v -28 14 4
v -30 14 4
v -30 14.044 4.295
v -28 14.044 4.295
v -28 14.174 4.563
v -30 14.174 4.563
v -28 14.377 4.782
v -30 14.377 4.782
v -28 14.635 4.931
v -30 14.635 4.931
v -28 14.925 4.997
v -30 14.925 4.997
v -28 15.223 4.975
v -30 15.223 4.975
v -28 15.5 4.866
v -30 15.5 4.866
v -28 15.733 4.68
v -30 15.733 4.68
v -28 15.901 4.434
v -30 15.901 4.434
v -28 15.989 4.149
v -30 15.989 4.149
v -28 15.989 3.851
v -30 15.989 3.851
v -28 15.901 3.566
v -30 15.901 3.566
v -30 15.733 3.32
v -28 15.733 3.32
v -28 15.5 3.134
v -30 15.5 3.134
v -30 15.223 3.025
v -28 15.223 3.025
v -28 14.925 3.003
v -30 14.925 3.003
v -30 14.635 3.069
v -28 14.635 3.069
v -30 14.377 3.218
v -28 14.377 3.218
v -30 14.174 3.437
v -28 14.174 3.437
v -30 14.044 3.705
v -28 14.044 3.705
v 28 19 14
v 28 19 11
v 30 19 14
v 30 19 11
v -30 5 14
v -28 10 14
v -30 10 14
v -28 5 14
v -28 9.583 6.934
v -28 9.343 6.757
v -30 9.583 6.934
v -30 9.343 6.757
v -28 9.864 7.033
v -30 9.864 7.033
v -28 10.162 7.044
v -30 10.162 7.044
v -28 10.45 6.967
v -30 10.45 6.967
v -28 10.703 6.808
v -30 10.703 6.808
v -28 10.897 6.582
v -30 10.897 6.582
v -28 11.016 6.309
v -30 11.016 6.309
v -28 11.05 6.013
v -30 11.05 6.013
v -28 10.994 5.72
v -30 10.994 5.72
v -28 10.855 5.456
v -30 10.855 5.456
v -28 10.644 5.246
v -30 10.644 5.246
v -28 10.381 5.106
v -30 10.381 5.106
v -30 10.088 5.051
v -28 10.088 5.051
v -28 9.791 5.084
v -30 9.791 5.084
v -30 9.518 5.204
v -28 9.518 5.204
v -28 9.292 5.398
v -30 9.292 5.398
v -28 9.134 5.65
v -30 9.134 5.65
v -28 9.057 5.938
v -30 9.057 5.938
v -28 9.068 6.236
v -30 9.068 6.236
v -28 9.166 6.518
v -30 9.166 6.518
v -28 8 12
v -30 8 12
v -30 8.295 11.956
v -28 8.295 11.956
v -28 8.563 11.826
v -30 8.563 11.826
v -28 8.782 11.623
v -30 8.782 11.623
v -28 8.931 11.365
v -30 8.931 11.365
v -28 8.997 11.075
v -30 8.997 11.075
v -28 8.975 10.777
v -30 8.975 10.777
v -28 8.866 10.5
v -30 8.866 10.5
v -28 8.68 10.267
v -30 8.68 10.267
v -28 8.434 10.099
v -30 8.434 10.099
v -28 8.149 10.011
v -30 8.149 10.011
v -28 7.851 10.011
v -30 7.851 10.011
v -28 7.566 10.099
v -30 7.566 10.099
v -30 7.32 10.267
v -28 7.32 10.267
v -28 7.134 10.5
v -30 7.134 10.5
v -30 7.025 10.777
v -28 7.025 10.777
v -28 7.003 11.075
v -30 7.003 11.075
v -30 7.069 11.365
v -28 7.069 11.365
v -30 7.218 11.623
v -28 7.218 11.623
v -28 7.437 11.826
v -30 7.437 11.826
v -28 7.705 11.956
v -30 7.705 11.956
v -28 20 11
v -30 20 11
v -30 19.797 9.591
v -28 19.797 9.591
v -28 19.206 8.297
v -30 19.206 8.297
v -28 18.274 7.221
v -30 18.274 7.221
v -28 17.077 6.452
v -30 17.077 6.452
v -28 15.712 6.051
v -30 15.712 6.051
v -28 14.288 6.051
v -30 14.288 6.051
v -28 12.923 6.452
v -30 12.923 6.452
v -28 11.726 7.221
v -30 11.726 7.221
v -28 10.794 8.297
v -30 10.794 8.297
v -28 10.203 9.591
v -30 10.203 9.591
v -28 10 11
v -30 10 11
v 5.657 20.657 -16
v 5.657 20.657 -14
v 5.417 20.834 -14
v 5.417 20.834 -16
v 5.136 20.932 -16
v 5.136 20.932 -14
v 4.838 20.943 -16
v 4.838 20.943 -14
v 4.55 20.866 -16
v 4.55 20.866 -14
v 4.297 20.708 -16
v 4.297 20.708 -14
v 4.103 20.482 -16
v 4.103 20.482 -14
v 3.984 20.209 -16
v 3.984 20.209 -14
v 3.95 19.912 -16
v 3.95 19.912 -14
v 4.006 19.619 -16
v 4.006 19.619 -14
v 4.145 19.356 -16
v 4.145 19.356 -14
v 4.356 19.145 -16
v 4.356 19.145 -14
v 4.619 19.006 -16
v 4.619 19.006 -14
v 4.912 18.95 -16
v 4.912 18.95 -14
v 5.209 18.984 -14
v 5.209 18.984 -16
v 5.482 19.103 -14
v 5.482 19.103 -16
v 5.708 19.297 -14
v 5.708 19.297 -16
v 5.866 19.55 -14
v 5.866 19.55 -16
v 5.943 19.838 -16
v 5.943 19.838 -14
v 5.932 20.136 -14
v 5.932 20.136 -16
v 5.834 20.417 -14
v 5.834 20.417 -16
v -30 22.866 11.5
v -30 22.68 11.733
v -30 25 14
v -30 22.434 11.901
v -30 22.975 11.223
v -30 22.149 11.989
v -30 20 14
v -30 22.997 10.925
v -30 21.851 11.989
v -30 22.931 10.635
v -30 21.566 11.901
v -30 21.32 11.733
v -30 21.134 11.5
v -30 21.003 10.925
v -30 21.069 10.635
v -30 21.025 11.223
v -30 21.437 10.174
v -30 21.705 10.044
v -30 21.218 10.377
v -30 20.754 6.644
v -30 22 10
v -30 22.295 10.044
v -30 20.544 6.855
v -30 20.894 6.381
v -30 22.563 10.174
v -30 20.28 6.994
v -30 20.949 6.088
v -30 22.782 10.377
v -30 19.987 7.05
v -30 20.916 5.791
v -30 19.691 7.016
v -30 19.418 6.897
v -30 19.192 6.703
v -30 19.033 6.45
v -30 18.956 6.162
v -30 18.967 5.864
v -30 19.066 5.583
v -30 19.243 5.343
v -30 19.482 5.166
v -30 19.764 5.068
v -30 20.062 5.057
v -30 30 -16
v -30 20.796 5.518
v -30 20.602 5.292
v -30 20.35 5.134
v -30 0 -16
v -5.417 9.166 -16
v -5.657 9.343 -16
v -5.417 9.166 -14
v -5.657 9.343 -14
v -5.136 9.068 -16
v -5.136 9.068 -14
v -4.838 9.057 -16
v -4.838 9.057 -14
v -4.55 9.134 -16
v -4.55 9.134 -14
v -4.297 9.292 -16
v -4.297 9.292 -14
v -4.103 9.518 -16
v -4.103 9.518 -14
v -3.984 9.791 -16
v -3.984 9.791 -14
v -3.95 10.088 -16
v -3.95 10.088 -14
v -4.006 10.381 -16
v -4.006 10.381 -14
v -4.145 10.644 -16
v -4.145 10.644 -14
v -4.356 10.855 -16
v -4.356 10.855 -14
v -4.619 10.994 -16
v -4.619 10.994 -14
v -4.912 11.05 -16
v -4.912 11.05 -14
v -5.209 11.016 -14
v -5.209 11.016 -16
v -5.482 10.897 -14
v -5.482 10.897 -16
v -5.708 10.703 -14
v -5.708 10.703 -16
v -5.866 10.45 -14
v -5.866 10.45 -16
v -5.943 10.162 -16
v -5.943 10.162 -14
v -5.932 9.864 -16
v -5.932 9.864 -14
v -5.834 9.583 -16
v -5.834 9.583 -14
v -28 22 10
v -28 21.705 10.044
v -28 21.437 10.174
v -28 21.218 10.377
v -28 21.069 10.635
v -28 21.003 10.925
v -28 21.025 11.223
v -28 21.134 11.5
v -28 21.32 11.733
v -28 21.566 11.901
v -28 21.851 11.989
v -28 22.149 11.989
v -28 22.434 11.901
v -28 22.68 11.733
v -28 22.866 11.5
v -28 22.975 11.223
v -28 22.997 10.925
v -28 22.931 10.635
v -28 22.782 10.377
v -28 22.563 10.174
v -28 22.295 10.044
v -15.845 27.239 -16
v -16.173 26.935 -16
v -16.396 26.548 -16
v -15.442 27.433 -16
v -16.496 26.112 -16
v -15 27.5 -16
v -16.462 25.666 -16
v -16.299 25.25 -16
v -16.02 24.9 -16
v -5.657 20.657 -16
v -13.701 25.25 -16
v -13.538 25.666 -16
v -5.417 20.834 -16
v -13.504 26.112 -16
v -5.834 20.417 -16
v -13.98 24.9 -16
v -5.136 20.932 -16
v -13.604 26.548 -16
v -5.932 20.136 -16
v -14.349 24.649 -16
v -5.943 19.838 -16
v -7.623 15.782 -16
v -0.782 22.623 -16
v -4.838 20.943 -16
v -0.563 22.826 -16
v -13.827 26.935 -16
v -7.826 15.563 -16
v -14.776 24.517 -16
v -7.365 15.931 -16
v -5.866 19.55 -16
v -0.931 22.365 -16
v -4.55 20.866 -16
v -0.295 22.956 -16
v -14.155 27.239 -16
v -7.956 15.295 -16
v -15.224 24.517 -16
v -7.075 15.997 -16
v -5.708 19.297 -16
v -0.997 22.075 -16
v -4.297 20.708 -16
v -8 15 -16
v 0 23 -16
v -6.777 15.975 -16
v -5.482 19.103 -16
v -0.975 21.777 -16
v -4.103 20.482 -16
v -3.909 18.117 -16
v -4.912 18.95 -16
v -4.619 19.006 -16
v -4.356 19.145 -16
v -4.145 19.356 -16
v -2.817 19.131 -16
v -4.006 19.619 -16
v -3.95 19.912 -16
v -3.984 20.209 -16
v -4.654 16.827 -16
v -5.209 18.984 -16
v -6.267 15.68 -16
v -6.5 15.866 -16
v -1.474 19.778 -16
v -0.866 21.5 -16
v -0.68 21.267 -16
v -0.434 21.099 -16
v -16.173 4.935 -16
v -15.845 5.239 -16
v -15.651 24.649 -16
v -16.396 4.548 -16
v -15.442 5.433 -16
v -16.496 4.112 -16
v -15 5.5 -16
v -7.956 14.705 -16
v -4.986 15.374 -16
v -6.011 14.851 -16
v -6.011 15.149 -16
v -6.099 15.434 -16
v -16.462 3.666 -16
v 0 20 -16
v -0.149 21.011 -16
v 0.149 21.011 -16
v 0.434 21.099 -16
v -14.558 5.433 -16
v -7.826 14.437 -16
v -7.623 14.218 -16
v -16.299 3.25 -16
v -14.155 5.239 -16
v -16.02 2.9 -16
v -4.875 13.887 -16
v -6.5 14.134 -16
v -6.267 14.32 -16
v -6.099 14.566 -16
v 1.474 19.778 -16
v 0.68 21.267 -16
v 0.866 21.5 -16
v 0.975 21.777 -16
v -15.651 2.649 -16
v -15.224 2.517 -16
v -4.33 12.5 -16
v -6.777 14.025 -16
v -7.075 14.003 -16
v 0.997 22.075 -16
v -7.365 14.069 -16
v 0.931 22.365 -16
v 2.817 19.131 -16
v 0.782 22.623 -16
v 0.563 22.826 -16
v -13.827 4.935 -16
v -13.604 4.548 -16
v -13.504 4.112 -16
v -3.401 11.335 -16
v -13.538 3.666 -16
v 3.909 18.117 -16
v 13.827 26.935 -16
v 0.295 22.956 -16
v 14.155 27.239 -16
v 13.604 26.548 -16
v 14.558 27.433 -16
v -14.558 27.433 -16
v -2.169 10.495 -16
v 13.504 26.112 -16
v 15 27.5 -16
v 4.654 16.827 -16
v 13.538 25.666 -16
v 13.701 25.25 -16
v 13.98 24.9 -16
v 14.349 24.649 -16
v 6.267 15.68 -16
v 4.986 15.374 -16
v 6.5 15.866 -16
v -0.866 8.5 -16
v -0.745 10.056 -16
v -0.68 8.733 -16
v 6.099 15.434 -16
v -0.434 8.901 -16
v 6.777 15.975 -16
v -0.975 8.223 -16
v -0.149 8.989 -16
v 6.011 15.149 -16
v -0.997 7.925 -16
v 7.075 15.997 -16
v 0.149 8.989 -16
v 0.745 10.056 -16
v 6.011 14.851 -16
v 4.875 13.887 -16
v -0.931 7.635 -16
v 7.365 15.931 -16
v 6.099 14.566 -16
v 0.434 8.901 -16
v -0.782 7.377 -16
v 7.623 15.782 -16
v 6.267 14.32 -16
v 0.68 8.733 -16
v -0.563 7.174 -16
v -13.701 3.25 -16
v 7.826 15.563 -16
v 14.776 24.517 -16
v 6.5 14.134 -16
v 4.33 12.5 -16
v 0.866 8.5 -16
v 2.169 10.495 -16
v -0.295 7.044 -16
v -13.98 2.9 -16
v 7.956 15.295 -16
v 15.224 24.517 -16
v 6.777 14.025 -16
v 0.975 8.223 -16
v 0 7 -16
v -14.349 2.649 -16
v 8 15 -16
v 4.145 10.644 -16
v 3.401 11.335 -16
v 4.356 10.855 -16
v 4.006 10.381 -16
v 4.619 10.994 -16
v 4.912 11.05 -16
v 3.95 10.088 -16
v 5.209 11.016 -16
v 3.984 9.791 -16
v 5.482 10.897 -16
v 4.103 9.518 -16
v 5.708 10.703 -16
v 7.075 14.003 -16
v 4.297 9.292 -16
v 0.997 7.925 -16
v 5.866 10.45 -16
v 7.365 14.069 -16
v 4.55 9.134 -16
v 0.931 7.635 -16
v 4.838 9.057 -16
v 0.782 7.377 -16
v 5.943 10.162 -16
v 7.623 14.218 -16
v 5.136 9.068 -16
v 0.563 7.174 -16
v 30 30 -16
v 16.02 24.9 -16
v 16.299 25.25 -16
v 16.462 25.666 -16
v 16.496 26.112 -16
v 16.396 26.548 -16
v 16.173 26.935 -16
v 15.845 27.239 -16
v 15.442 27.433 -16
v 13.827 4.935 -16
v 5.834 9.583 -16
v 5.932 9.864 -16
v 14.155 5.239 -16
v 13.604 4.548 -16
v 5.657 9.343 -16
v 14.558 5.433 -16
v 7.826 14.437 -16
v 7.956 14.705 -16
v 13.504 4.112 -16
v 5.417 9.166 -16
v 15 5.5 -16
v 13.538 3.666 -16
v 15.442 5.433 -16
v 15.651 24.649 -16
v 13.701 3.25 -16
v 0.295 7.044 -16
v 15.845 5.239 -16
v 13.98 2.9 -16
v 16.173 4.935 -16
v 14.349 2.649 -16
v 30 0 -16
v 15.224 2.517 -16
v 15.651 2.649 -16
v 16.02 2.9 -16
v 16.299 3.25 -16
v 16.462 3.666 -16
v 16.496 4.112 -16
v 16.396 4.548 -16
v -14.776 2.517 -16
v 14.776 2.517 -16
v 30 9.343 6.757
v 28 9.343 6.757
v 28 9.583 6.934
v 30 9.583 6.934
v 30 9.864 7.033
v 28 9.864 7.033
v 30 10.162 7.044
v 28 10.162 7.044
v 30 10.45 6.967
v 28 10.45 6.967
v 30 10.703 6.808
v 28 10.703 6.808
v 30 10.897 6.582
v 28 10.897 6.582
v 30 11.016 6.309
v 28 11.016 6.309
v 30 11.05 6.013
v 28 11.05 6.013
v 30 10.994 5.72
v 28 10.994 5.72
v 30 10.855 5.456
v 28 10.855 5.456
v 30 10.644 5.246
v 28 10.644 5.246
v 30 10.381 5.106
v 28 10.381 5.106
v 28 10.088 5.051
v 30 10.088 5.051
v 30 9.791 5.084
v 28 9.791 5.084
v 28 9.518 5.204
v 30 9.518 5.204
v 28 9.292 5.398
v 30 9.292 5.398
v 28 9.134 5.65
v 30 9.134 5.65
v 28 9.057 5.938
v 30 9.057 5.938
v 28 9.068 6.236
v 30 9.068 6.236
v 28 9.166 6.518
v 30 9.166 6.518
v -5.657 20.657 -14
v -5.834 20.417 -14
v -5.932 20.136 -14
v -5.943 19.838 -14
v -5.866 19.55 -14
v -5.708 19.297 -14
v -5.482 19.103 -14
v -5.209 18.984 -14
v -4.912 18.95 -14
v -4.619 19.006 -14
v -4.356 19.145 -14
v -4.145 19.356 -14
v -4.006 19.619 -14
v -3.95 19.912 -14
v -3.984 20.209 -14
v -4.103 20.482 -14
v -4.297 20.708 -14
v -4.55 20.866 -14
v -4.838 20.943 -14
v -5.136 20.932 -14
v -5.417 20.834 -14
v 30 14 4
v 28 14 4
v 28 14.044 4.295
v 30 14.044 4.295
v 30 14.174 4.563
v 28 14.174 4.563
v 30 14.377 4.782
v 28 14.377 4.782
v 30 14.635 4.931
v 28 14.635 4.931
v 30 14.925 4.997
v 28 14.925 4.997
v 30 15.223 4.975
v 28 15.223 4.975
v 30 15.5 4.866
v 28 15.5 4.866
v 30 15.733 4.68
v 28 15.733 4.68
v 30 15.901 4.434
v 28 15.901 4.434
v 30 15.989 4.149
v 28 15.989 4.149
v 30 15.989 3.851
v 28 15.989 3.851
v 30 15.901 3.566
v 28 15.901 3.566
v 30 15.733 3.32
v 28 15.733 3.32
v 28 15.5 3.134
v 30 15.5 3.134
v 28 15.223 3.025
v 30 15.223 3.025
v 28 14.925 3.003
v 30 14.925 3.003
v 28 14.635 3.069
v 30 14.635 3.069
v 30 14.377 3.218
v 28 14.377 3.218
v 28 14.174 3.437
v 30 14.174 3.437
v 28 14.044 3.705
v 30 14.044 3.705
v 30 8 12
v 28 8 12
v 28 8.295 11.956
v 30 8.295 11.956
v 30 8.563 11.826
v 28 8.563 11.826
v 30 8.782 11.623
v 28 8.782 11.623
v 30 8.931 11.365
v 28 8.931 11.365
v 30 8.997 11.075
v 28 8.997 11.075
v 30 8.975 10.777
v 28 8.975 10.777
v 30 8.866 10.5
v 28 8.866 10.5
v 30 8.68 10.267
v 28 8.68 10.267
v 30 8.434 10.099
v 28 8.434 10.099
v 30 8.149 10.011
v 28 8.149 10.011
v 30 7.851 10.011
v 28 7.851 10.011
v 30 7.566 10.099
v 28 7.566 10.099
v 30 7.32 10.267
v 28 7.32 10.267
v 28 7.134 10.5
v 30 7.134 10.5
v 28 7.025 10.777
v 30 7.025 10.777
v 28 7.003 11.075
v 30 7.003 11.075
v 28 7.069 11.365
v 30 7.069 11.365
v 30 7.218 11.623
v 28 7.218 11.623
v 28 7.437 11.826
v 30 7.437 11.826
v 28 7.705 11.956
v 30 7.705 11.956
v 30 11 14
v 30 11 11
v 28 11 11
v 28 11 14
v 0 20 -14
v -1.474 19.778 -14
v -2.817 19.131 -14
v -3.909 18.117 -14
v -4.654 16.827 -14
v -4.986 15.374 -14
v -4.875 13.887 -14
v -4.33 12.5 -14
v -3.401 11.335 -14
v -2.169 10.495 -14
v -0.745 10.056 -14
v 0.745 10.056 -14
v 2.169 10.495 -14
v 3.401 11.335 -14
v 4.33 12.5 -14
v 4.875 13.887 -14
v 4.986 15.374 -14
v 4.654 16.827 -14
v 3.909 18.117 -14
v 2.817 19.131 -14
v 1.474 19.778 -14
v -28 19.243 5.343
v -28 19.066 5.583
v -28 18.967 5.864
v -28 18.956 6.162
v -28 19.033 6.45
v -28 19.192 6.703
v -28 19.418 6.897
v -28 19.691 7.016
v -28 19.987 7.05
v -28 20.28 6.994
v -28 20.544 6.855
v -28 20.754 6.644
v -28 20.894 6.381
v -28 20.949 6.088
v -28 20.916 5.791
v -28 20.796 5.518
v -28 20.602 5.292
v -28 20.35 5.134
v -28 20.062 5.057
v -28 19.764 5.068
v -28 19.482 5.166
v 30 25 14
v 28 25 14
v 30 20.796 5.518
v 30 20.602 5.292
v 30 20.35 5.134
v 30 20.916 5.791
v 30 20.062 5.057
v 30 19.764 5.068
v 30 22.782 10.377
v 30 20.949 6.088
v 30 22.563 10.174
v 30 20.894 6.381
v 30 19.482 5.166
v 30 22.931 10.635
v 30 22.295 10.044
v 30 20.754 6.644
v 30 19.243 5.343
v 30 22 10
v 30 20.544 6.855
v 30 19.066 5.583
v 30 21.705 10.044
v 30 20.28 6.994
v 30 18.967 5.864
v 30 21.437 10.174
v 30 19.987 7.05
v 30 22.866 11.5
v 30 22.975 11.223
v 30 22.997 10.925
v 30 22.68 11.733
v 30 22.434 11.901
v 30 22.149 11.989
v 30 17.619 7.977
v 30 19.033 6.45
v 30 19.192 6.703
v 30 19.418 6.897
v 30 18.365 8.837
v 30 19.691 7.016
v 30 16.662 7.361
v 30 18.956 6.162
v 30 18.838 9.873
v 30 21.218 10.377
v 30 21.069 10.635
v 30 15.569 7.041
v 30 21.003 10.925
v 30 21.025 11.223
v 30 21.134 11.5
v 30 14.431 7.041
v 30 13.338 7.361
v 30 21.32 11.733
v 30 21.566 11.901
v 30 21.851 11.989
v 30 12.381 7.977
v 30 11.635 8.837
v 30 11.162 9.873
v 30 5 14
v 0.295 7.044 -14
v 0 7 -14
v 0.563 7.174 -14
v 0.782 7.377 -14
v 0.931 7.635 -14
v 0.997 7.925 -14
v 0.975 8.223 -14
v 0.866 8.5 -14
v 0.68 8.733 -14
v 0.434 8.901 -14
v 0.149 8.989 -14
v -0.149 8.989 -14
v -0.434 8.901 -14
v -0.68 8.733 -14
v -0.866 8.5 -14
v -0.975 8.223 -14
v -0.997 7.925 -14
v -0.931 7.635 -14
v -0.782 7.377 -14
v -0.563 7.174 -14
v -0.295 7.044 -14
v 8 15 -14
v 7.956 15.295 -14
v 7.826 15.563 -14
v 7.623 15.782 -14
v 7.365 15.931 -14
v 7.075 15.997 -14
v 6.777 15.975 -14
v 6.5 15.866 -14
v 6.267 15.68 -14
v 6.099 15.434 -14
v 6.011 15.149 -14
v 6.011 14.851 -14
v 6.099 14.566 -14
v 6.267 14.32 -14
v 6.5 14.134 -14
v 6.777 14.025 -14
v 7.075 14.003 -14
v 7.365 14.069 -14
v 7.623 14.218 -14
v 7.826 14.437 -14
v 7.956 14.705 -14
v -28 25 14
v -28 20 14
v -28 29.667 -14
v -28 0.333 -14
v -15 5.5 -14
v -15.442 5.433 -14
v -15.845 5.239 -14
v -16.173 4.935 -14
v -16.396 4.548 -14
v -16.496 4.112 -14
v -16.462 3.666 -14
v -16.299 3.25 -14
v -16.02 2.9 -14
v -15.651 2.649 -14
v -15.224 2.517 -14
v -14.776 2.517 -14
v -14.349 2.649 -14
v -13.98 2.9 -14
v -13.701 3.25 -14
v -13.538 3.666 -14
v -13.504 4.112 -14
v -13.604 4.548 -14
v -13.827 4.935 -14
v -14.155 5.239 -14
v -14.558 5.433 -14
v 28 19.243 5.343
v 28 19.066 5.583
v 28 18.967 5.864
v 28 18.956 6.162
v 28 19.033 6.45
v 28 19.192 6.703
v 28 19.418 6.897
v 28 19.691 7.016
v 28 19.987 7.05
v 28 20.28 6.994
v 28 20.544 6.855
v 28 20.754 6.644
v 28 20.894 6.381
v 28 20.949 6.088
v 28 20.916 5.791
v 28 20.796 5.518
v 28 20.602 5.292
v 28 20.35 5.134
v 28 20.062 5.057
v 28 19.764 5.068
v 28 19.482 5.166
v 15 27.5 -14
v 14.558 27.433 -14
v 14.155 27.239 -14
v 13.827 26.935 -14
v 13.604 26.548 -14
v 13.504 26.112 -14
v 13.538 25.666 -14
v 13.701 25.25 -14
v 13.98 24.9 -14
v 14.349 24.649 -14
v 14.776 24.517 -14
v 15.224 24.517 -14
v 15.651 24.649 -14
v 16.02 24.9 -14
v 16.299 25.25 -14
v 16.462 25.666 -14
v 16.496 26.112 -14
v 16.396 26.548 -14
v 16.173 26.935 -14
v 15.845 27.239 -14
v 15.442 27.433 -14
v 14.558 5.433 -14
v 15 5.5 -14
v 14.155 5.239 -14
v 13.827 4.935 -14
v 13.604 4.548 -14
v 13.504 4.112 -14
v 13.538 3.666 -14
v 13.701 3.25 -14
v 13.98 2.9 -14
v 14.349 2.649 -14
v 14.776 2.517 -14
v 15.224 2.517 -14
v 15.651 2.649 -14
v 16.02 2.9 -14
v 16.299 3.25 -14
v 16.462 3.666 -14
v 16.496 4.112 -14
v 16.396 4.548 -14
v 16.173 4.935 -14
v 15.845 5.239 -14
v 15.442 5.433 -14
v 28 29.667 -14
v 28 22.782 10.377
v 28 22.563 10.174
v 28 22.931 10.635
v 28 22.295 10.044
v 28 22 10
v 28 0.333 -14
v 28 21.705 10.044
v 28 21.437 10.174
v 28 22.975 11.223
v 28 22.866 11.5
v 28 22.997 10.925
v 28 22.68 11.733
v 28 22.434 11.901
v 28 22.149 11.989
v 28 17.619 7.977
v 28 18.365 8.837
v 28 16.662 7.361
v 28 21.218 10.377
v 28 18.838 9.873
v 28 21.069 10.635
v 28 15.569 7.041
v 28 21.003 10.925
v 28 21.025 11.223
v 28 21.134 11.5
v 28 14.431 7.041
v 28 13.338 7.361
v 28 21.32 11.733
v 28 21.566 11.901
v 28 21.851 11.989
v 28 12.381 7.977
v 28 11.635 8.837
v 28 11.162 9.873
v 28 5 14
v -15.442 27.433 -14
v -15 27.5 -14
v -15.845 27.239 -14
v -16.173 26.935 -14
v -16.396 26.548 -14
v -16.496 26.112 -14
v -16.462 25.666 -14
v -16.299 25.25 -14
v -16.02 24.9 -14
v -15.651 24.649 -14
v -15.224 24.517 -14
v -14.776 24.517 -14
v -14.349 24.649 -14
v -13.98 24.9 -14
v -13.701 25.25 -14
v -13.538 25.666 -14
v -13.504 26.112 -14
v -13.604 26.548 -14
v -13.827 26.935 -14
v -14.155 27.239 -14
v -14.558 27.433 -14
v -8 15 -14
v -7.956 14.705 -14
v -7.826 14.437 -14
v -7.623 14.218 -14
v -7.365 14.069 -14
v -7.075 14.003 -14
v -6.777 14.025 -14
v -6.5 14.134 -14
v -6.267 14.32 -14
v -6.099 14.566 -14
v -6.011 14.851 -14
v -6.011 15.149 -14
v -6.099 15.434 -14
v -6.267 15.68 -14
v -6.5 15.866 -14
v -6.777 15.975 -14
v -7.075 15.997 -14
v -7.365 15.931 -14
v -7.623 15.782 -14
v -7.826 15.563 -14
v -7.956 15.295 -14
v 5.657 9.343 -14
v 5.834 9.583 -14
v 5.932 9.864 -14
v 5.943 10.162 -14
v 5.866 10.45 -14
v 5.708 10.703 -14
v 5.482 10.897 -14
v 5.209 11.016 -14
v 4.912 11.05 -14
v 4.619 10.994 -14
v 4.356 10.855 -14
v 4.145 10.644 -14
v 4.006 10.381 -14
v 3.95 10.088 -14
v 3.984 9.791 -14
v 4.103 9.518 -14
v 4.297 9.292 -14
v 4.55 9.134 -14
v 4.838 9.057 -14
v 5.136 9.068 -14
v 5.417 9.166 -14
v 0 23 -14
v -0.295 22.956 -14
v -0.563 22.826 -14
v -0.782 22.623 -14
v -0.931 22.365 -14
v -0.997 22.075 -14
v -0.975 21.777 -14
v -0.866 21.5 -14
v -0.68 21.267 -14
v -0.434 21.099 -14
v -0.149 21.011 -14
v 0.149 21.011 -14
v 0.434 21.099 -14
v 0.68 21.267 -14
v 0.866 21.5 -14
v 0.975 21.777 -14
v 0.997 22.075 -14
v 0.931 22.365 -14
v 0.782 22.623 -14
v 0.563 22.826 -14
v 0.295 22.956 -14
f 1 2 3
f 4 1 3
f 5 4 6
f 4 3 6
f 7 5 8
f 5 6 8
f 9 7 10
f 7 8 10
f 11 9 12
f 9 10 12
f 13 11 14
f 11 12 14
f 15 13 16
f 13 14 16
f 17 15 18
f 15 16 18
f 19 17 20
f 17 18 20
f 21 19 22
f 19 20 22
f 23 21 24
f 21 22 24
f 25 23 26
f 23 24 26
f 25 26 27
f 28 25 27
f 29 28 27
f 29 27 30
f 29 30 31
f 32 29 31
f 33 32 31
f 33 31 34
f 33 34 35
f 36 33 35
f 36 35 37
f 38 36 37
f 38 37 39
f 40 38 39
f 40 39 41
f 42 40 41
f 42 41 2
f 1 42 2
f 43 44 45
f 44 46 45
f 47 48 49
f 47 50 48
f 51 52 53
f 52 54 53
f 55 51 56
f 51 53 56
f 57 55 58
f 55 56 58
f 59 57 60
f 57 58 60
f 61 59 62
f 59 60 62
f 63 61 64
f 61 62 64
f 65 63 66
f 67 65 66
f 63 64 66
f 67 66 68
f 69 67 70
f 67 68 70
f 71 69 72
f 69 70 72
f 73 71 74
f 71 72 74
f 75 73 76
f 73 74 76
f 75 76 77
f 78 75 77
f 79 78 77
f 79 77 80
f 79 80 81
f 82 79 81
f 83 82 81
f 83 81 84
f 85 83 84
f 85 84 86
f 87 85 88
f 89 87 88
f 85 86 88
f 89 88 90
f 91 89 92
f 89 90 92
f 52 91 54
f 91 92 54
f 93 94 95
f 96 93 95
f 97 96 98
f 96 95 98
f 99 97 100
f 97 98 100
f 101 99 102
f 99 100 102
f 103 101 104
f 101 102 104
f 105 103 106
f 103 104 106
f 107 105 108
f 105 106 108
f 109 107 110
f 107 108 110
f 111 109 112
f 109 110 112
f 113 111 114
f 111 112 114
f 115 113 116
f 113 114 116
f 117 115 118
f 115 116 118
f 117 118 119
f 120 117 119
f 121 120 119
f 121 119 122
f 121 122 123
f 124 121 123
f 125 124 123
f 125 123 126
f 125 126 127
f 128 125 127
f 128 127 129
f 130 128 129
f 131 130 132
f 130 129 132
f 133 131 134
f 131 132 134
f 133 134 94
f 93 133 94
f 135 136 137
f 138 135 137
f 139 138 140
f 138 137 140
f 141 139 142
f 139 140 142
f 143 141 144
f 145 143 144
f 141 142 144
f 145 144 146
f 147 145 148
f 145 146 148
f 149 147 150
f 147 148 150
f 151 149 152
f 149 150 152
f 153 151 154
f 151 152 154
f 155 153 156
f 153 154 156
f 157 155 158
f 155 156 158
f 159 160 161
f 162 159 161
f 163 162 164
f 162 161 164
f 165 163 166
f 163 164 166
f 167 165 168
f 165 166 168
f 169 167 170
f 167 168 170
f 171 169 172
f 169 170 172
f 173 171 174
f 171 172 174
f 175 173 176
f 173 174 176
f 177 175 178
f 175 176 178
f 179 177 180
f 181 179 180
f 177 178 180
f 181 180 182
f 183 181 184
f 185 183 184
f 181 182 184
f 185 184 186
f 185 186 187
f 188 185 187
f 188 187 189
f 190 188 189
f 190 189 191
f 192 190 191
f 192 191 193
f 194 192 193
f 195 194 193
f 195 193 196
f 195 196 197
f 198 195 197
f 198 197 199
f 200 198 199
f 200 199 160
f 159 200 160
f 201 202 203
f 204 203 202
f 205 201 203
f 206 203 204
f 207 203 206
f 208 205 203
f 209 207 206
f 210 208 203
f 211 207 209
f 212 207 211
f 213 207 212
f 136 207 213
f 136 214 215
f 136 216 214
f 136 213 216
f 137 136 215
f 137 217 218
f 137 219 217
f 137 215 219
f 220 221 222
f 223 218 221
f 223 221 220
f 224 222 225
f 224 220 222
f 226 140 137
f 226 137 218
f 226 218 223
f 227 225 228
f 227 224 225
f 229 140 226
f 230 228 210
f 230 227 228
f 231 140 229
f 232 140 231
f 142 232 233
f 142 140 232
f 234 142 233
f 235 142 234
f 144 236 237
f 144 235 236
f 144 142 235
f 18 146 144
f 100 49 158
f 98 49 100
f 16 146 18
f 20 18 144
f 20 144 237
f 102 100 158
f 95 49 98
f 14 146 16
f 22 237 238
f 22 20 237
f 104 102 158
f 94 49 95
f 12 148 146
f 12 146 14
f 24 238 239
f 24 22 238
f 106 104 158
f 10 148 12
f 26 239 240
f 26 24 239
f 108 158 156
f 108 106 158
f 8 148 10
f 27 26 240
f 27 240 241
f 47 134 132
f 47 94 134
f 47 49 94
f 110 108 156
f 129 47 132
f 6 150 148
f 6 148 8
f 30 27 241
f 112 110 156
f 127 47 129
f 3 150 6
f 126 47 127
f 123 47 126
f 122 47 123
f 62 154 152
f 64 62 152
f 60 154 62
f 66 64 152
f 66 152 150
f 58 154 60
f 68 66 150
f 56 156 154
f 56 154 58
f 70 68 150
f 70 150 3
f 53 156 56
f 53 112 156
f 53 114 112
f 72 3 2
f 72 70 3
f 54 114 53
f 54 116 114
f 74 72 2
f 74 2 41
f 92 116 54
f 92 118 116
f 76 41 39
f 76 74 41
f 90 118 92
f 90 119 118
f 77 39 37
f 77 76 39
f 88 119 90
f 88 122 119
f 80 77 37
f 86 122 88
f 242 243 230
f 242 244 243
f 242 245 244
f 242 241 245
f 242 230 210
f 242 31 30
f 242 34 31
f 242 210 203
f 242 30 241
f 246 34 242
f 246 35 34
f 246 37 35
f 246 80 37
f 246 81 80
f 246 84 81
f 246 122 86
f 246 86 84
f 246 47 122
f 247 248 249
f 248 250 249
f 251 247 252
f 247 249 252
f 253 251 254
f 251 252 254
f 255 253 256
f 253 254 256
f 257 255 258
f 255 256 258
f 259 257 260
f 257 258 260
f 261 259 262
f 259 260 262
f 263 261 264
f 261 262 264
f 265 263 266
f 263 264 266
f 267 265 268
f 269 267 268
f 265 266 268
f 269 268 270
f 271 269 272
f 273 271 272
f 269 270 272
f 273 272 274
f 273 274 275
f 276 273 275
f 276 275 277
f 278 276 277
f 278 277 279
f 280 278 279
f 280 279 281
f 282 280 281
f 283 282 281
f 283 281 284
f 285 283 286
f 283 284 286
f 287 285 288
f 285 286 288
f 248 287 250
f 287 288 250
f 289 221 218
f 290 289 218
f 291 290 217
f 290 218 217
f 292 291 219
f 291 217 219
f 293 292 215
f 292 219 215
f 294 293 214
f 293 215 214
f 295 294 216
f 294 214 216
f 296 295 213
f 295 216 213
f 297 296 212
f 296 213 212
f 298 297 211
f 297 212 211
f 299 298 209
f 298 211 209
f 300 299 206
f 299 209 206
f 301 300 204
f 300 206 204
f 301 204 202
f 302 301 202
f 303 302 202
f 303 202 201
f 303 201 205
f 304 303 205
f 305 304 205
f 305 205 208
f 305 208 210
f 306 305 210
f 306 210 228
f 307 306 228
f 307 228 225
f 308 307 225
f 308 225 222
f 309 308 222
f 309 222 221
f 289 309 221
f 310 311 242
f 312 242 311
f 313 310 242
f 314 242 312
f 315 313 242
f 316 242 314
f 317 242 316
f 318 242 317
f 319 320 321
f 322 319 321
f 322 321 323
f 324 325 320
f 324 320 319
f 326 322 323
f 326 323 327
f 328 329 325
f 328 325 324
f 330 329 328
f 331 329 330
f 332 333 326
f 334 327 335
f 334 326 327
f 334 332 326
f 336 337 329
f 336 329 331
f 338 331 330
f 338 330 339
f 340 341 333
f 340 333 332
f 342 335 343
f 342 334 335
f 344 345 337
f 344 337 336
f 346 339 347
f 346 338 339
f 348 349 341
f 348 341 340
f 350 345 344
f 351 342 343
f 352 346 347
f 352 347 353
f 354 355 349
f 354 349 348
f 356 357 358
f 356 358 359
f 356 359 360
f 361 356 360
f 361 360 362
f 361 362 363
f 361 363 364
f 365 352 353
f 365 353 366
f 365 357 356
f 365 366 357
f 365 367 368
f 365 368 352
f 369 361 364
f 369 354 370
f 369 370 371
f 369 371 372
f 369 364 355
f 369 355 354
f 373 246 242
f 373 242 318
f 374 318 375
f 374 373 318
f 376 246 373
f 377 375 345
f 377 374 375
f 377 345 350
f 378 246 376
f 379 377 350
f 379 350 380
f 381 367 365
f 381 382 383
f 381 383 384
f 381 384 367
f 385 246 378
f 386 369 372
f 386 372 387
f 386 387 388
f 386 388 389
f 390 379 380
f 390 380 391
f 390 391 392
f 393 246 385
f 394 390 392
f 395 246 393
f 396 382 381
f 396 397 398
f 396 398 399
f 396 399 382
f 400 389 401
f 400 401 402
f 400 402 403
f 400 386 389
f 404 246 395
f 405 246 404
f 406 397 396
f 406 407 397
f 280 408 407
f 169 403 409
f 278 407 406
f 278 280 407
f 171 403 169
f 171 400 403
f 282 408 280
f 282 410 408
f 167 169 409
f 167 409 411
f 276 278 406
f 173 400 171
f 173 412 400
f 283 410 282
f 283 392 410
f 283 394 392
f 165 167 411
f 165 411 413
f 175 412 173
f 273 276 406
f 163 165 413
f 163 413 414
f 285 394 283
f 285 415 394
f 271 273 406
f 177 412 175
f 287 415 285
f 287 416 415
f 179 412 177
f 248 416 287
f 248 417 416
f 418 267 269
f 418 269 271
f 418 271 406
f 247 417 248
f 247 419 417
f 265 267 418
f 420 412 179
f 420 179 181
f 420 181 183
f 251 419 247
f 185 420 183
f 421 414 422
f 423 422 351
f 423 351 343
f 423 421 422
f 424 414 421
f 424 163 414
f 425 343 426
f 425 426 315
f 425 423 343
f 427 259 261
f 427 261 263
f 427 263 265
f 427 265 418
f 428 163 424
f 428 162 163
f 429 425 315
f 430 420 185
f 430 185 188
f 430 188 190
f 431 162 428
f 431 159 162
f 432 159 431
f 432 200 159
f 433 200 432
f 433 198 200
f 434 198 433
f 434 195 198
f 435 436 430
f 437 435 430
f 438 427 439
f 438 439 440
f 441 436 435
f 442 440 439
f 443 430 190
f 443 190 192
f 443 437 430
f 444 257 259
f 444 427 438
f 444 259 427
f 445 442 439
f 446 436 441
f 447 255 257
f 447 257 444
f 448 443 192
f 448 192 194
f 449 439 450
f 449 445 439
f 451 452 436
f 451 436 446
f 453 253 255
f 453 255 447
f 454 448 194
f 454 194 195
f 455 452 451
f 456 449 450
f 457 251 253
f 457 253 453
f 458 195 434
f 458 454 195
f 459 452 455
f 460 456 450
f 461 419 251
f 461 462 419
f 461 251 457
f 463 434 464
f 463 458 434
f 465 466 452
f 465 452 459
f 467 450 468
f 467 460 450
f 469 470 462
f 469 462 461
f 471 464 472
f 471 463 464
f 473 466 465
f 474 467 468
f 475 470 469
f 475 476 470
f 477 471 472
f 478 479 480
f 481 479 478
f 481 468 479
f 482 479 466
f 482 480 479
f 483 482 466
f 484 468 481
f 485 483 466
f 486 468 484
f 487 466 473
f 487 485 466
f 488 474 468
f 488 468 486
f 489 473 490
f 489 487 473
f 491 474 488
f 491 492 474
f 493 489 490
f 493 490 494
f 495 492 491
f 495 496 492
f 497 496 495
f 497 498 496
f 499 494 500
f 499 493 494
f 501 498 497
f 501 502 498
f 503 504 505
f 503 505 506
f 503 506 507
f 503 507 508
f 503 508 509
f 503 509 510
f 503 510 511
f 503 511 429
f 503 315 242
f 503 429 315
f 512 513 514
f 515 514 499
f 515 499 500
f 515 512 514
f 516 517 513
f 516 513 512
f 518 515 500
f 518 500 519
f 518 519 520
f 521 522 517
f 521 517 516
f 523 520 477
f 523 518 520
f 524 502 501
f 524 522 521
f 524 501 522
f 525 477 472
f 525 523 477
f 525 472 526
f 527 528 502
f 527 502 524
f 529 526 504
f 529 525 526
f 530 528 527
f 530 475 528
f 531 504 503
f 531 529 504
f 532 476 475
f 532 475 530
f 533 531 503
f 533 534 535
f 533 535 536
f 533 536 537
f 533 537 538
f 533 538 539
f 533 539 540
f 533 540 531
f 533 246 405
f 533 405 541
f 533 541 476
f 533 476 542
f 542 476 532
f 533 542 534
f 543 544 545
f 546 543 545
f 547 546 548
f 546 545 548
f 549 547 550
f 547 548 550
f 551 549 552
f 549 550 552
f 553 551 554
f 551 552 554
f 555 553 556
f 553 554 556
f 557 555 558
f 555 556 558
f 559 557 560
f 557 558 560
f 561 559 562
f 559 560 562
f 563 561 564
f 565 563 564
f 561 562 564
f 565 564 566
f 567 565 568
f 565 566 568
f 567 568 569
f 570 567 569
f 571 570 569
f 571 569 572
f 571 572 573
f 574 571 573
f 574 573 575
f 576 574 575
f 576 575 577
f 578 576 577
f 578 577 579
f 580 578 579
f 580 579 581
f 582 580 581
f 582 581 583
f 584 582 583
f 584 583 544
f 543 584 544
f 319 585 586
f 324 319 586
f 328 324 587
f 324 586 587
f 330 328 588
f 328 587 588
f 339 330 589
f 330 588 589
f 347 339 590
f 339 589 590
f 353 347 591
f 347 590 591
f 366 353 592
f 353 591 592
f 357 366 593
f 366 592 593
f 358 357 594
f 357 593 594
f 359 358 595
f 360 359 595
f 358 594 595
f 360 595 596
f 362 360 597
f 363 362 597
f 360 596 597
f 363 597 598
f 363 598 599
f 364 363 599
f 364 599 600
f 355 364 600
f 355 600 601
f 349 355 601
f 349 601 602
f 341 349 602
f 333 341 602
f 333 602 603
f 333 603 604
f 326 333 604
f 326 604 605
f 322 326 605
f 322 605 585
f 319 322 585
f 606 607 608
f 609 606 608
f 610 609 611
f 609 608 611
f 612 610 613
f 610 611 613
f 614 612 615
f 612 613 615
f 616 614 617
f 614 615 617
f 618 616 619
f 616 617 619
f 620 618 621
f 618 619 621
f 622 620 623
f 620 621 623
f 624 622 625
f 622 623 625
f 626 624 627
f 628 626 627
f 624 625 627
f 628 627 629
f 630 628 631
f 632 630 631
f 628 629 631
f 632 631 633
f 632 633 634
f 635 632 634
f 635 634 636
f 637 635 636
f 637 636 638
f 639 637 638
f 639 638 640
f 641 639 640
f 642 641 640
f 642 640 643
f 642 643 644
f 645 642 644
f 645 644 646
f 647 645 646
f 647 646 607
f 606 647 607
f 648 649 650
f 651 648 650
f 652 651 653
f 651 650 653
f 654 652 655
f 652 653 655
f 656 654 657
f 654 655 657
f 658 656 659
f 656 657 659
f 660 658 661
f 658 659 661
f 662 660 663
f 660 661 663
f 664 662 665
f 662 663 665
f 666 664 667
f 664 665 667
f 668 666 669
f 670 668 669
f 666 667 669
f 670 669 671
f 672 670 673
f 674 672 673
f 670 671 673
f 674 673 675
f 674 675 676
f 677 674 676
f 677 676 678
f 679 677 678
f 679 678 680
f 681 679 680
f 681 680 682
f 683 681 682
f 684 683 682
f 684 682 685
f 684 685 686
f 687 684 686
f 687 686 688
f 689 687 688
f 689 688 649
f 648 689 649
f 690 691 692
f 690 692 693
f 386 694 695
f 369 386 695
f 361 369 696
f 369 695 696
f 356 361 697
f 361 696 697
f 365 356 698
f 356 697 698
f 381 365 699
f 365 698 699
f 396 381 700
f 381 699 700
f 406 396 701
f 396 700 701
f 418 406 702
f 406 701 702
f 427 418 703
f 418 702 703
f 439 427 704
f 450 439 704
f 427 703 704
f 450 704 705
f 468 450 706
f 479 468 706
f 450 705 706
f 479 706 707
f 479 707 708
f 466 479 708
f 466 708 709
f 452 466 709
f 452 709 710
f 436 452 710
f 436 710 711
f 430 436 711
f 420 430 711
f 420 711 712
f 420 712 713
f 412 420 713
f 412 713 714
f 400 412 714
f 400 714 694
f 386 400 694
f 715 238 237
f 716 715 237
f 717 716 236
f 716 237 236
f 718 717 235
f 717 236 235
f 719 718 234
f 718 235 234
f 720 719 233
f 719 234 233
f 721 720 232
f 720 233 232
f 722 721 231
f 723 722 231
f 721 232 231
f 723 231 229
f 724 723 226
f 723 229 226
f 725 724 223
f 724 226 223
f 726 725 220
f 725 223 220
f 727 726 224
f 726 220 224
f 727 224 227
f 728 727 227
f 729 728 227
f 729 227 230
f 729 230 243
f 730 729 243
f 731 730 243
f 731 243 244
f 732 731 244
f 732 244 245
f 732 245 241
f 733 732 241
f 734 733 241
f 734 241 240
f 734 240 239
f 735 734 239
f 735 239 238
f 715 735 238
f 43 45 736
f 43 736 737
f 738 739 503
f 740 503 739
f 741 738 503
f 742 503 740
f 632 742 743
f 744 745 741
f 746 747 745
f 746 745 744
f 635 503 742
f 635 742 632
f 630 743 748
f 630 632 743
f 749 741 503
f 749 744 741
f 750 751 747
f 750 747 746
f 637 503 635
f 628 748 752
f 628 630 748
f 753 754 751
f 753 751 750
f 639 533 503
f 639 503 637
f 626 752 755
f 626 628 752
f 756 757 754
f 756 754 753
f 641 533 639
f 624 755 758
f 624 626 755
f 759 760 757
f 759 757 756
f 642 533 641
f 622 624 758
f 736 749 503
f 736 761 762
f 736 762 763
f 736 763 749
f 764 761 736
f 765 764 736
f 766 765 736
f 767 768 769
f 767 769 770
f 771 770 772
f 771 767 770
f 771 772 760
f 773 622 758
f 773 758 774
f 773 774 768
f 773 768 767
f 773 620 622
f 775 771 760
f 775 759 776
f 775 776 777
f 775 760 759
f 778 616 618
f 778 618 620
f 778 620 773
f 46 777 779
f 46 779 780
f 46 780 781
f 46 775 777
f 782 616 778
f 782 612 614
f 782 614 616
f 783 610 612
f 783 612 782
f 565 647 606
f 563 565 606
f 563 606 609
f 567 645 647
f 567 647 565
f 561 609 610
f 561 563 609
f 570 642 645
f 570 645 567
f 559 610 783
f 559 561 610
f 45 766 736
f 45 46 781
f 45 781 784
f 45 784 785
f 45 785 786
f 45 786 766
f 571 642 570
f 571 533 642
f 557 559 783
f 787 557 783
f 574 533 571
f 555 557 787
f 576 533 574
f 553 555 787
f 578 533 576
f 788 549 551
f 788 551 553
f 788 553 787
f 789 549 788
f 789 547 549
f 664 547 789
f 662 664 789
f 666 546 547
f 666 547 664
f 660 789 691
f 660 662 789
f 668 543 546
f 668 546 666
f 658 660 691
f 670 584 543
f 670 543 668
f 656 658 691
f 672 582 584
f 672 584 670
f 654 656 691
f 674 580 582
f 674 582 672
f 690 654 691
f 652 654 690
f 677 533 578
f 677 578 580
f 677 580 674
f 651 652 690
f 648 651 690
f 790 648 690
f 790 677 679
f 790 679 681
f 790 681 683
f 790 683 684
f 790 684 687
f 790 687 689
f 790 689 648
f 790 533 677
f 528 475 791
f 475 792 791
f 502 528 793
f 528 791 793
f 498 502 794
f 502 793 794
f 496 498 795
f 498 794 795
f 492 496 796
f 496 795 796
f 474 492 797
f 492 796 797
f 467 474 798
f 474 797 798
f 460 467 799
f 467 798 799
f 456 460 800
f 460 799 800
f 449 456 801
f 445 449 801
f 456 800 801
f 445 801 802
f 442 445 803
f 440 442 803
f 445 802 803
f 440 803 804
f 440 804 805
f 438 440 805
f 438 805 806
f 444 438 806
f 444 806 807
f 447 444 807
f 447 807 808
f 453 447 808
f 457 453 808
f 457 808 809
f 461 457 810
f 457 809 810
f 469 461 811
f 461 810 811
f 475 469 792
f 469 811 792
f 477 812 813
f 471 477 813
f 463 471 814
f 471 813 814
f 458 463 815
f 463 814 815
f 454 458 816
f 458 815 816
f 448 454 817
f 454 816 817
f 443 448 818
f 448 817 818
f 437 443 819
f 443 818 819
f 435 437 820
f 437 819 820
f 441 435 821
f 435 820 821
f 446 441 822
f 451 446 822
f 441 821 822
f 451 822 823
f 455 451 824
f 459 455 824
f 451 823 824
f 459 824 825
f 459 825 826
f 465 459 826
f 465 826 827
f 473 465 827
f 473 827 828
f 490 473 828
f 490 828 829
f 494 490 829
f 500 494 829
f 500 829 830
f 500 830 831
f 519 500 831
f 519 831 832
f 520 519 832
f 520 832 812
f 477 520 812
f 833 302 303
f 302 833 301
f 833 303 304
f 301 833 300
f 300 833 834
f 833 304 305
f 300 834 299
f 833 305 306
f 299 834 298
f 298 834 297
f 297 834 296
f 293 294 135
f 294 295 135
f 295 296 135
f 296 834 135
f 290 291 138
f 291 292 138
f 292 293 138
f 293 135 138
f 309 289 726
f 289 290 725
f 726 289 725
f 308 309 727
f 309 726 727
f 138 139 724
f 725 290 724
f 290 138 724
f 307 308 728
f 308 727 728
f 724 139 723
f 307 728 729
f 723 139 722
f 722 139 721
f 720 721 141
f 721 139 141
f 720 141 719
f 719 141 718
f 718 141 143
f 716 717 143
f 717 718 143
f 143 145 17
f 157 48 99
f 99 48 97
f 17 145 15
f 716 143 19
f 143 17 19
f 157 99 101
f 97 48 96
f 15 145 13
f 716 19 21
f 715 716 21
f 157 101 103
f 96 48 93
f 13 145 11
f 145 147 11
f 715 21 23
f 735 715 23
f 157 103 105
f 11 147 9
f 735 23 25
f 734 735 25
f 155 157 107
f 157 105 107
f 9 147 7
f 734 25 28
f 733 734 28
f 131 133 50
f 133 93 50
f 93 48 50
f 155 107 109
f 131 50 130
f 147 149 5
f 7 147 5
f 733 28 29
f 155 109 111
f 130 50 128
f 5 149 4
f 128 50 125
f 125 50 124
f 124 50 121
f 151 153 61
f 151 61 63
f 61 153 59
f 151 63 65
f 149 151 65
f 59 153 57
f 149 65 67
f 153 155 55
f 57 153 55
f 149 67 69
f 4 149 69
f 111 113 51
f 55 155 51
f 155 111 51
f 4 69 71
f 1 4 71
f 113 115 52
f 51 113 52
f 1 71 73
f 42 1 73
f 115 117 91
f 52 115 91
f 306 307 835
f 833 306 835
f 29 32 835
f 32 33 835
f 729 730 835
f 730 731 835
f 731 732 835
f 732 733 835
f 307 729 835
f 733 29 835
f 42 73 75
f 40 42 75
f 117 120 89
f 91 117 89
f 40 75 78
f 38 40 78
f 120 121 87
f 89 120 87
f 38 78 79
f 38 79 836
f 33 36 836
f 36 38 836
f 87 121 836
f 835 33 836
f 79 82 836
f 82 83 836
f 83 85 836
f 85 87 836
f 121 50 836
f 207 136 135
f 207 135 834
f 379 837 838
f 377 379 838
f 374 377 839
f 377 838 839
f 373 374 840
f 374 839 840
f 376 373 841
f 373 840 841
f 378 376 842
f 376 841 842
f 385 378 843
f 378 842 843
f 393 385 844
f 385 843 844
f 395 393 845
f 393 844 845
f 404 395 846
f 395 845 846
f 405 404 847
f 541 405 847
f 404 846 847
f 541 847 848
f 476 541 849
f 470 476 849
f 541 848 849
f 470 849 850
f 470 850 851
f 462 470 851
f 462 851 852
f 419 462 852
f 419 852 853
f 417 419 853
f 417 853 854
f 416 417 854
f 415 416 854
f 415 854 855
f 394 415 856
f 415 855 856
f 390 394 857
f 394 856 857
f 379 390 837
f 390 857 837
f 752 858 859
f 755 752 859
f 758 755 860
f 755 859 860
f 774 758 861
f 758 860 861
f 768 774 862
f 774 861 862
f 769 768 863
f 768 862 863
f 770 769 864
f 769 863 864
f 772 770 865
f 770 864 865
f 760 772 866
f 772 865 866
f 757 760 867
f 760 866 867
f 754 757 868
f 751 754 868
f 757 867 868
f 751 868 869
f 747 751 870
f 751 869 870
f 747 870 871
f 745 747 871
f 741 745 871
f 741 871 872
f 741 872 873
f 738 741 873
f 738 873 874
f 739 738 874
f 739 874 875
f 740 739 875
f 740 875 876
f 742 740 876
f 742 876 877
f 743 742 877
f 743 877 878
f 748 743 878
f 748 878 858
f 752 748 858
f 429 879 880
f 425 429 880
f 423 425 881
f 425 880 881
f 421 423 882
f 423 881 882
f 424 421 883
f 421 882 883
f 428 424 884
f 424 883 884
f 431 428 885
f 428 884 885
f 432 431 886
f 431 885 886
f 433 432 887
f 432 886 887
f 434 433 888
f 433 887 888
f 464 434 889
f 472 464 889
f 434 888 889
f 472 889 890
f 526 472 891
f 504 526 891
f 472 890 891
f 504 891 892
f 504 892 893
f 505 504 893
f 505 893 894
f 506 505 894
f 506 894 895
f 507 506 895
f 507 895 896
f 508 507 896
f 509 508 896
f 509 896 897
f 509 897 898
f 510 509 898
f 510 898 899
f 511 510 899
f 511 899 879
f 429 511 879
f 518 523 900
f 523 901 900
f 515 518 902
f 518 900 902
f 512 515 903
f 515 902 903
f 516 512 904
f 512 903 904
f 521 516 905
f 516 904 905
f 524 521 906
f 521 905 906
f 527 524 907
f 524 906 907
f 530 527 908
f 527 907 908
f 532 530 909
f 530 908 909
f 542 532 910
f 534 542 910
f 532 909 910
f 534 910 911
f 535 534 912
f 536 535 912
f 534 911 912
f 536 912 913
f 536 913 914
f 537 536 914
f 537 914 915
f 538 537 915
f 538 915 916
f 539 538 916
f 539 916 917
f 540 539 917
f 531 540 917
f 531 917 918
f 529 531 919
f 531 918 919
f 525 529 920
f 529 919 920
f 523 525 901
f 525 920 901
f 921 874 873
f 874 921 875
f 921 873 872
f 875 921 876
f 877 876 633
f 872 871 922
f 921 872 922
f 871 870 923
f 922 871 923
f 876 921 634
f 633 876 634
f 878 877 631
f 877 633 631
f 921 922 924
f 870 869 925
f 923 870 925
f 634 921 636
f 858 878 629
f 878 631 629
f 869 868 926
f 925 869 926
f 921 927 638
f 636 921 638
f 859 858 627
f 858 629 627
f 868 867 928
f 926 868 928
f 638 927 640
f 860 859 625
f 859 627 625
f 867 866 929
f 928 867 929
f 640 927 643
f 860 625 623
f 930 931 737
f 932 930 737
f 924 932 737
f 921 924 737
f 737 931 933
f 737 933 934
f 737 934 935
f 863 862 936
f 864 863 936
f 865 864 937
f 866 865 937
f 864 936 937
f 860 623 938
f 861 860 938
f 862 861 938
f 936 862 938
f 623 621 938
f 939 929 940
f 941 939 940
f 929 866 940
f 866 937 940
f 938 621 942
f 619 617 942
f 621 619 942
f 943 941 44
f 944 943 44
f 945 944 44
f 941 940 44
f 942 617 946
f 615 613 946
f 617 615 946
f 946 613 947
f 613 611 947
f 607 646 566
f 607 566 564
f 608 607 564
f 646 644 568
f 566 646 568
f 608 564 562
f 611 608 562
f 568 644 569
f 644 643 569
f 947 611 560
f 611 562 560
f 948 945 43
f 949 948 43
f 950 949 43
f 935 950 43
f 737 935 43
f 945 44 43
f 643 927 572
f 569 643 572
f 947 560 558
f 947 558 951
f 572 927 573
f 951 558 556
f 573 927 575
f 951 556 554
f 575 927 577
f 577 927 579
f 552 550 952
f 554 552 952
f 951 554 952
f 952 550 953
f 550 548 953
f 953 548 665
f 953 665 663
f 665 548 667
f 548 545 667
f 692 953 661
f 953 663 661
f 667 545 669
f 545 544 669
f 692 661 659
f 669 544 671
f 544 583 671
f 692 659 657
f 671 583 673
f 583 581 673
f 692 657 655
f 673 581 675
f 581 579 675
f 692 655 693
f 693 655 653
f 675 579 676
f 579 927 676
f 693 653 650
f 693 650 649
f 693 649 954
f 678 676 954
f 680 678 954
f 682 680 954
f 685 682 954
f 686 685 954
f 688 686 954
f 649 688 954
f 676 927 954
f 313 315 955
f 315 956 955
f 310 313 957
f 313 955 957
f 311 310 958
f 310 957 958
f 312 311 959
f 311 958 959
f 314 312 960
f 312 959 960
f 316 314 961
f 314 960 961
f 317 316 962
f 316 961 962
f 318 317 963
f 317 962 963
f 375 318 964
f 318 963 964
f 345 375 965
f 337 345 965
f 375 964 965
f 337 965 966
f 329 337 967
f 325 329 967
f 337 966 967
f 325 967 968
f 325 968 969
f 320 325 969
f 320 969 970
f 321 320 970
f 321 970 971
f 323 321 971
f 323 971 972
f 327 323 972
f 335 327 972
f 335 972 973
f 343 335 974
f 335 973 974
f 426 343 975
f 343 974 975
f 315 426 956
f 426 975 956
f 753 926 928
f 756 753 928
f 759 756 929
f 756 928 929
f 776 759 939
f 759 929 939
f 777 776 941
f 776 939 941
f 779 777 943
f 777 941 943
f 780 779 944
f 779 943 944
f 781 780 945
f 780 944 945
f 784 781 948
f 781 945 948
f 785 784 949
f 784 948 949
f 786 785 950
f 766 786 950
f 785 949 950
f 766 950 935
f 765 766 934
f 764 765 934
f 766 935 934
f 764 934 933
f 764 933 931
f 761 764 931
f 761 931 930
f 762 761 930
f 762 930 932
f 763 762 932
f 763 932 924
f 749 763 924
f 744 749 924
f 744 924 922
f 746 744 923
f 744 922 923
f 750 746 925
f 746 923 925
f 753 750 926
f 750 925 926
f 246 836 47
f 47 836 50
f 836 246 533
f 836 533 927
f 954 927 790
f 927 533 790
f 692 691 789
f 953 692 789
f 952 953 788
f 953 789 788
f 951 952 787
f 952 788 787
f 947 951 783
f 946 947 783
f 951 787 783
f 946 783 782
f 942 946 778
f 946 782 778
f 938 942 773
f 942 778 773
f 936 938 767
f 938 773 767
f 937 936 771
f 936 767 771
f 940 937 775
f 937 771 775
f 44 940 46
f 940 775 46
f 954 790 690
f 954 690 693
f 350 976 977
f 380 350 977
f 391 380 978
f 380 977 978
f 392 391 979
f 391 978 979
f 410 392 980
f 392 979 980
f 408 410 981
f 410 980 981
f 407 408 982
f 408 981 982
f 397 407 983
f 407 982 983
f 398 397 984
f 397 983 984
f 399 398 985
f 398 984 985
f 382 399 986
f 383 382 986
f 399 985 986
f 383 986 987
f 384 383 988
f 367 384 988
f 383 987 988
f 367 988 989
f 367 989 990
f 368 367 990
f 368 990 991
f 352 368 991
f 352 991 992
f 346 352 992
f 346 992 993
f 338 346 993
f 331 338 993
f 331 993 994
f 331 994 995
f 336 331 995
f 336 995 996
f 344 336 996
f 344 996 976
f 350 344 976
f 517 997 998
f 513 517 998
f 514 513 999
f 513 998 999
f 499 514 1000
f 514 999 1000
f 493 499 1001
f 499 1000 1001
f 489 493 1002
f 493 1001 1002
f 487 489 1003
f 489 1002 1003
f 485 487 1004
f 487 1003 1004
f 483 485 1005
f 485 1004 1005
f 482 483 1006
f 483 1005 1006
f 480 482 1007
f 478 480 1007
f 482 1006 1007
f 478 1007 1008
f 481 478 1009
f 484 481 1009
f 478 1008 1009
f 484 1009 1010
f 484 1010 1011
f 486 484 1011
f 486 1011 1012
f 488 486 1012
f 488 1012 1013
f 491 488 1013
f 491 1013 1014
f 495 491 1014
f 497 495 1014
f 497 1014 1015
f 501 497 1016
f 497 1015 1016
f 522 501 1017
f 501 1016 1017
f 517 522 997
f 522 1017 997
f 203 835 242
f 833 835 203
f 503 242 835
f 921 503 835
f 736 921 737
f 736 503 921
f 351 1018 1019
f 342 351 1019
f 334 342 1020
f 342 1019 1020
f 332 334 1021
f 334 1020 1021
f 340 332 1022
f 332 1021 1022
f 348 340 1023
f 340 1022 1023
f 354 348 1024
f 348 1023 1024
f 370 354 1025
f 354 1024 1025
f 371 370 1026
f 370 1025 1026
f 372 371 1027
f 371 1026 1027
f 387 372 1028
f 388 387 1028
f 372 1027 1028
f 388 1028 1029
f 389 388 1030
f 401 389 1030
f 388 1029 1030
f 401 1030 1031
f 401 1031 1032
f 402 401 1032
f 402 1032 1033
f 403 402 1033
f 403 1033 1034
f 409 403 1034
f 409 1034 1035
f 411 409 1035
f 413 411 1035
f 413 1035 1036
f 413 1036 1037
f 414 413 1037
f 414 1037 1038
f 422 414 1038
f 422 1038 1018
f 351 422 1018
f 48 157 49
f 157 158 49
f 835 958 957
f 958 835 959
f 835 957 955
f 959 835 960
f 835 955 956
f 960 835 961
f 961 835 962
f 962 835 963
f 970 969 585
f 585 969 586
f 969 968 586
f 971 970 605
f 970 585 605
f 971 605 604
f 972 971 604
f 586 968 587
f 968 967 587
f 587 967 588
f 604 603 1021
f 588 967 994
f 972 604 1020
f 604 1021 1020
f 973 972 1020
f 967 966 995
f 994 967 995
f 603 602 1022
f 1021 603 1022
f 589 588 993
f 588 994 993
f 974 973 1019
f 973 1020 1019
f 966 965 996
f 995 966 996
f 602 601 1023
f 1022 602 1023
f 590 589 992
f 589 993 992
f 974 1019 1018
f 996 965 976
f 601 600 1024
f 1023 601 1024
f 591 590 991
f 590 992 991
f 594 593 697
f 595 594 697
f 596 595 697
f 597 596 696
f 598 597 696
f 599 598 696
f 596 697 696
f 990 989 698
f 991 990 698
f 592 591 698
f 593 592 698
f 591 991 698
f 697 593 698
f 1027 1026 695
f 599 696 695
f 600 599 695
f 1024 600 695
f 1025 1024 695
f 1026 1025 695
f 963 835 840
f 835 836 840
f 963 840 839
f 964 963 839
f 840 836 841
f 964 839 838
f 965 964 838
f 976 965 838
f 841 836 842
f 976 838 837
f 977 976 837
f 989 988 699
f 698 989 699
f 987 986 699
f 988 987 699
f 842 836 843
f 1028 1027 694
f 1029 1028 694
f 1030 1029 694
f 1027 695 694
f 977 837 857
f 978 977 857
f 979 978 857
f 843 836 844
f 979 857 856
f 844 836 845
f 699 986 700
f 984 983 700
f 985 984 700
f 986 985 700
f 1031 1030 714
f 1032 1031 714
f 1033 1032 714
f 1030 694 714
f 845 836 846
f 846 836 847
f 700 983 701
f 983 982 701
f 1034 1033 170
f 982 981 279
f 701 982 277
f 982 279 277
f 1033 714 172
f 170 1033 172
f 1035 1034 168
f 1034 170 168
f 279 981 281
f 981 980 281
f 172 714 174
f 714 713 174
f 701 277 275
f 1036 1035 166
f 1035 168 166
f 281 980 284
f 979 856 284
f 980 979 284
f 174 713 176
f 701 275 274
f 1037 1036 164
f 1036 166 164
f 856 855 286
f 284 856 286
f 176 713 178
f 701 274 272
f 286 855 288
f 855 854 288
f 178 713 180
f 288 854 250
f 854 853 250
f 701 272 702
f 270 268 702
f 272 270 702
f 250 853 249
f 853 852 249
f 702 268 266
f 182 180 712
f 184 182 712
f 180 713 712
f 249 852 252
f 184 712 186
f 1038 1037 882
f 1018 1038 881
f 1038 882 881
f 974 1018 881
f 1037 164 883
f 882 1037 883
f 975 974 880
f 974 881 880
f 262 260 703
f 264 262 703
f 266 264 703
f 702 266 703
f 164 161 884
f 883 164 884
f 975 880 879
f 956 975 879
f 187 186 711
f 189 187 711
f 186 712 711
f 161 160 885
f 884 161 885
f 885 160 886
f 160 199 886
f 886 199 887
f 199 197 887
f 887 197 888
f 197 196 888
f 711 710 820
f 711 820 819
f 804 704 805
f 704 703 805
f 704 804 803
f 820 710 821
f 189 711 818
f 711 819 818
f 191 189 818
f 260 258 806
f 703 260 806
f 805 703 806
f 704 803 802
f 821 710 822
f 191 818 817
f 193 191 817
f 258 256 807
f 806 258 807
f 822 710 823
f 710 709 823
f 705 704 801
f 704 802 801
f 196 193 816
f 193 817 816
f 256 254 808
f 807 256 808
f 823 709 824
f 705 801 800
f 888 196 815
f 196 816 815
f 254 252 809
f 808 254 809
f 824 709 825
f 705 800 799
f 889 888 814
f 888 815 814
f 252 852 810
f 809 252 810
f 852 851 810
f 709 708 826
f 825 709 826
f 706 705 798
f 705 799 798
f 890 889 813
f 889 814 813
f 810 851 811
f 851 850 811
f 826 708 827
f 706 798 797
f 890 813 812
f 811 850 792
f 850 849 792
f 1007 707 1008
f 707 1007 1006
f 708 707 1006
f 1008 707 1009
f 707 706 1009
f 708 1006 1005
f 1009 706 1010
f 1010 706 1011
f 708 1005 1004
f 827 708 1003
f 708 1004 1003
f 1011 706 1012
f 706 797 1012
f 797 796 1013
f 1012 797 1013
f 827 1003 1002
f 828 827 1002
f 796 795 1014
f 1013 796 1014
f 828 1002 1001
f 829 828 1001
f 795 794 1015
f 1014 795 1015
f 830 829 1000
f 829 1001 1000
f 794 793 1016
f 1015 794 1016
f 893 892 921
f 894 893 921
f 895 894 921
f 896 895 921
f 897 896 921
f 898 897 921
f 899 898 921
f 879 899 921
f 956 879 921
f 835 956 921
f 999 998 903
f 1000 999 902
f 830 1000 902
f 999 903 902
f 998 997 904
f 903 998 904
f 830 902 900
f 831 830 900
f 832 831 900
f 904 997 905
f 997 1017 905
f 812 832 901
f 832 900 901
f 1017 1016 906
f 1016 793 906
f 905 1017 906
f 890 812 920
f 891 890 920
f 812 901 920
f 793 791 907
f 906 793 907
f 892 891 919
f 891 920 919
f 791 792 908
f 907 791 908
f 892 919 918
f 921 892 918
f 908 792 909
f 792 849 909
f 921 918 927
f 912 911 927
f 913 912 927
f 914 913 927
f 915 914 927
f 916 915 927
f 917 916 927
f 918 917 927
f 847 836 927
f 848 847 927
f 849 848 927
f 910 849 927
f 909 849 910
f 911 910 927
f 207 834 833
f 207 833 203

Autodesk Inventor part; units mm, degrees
ref_plane "YZ Plane" through (0, 0, 0) normal (1, 0, 0) x (0, 1, 0)
ref_plane "XZ Plane" through (0, 0, 0) normal (0, 1, 0) x (-1, 0, 0)
ref_plane "XY Plane" through (0, 0, 0) normal (0, 0, 1) x (1, 0, 0)
sketch "スケッチ1" plane through (0, 0, 0) normal (0, 1, 0) x (-1, 0, 0)
  line L0 (30, 14) -> (30, -16)
  line L1 (30, -16) -> (-30, -16)
  line L2 (-30, -16) -> (-30, 14)
  line L3 (28, 14) -> (28, -14)
  line L4 (28, -14) -> (-28, -14)
  line L5 (-28, -14) -> (-28, 14)
  line L6 (-30, 14) -> (-28, 14)
  line L7 (28, 14) -> (30, 14)
  point P0 (0, 0)
  dimension "d0" = 60
  dimension "d2" = 30
  dimension "d3" = 28
  dimension "d4" = 56
  dimension "d5" = 28
  dimension "d6" = 14
  dimension "d7" = 30
  dimension "d8" = 16
  dimension "d9" = 28
  dimension "d11" = 28
extrude "押し出し1" add sketch "スケッチ1" along normal blind 30
sketch "スケッチ2" plane through (30, 0, 14) normal (1, 0, 0) x (0, 0, -1)
  line L0 (30, 0) -> (30, 30)
  line L1 (0, 0) -> (0, 30)
  line L2 (30, 30) -> (0, 25)
  line L3 (30, 0) -> (0, 5)
  point P0 (14, 0)
  dimension "d75" = 20
extrude "押し出し2" cut sketch "スケッチ2" against normal blind 60 keep common part
sketch "スケッチ3" plane through (30, 0, -16) normal (1, 0, 0) x (0, 0, -1)
  line L0 (-30, 5) -> (-30, 25)
  line L1 (0, 0) -> (0, 30)
  arc A0 (-27, 11) -> (-27, 19) centre (-27, 15) ccw
  line L2 (-27, 19) -> (-30, 19)
  line L3 (-27, 11) -> (-30, 11)
  point P0 (-16, 0)
  dimension "d20" = 8
  dimension "d79" = 3
  dimension "d82" = 15
extrude "押し出し3" cut sketch "スケッチ3" against normal blind 2
sketch "スケッチ4" plane through (-30, 0, -16) normal (-1, 0, 0) x (0, 0, 1)
  line L0 (30, 5) -> (30, 25)
  arc A0 (27, 20) -> (27, 10) centre (27, 15) ccw
  line L1 (27, 20) -> (30, 20)
  line L2 (27, 10) -> (30, 10)
  point P0 (16, 0)
  point P1 (0, 30)
  dimension "d25" = 10
  dimension "d80" = 3
  dimension "d81" = 15
extrude "押し出し4" cut sketch "スケッチ4" against normal blind 2
sketch "スケッチ7" plane through (30, 0, -16) normal (0, 0, -1) x (-1, 0, 0)
  line L0 (0, 0) -> (60, 0)
  line L1 (0, 0) -> (0, 30)
  circle A0 centre (30, 15) radius 5
  point P0 (30, 0)
  dimension "d45" = 10
  dimension "d47" = 15
  dimension "d48" = 30
hole "穴2" at (0, 15, -16) direction (0, 0, 1) diameter 10 end through all
sketch "スケッチ8" plane through (30, 0, -16) normal (0, 0, -1) x (-1, 0, 0)
  circle A0 centre (30, 15) radius 5
  line L0 (0, 0) -> (0, 30)
  circle A1 centre (30, 22) radius 1
  line L1 (30, 15) -> (30, 22)
  point P0 (30, 0)
  dimension "d56" = 2
  dimension "d58" = 0
  dimension "d62" = 7
hole "穴3" at (0, 22, -16) direction (0, 0, 1) diameter 2 end through all
pattern_circular "円形状パターン2" count 8 over 360 about axis through (0, 15, 57.4847) along (0, 0, -1) of "穴2", "穴3"
sketch "スケッチ9" plane through (30, 0, -16) normal (1, 0, 0) x (0, 0, -1)
  arc A0 (-27, 11) -> (-27, 19) centre (-27, 15) ccw
  line L0 (-30, 19) -> (-30, 25)
  circle A1 centre (-27, 22) radius 1
  line L1 (-27, 15) -> (-27, 22)
  point P0 (-16, 0)
  dimension "d83" = 2
  dimension "d85" = 7
hole "穴4" at (30, 22, 11) direction (-1, 0, 0) diameter 2 end through all
pattern_circular "円形状パターン3" count 5 over 180 about axis through (30, 15, 11) along (-1, 0, 0) of "穴4"
sketch "スケッチ10" plane through (30, 0, -16) normal (0, 0, -1) x (-1, 0, 0)
  circle A0 centre (30, 15) radius 5
  line L0 (0, 30) -> (60, 30)
  circle A1 centre (15, 26) radius 1.5
  circle A2 centre (15, 4) radius 1.5
  circle A3 centre (45, 4) radius 1.5
  circle A4 centre (45, 26) radius 1.5
  point P0 (30, 0)
  dimension "d96" = 30
  dimension "d98" = 22
  dimension "d99" = 4
  dimension "d100" = 22
  dimension "d101" = 4
  dimension "d102" = 30
  dimension "d103" = 15
  dimension "d104" = 15
  dimension "d105" = 3
hole "穴5" at (15, 4, -16) at (-15, 4, -16) at (-15, 26, -16) at (15, 26, -16) direction (0, 0, 1) diameter 3 end through all
thread "ねじ5"
thread "ねじ6"
thread "ねじ7"
thread "ねじ8"
properties part number "5"
